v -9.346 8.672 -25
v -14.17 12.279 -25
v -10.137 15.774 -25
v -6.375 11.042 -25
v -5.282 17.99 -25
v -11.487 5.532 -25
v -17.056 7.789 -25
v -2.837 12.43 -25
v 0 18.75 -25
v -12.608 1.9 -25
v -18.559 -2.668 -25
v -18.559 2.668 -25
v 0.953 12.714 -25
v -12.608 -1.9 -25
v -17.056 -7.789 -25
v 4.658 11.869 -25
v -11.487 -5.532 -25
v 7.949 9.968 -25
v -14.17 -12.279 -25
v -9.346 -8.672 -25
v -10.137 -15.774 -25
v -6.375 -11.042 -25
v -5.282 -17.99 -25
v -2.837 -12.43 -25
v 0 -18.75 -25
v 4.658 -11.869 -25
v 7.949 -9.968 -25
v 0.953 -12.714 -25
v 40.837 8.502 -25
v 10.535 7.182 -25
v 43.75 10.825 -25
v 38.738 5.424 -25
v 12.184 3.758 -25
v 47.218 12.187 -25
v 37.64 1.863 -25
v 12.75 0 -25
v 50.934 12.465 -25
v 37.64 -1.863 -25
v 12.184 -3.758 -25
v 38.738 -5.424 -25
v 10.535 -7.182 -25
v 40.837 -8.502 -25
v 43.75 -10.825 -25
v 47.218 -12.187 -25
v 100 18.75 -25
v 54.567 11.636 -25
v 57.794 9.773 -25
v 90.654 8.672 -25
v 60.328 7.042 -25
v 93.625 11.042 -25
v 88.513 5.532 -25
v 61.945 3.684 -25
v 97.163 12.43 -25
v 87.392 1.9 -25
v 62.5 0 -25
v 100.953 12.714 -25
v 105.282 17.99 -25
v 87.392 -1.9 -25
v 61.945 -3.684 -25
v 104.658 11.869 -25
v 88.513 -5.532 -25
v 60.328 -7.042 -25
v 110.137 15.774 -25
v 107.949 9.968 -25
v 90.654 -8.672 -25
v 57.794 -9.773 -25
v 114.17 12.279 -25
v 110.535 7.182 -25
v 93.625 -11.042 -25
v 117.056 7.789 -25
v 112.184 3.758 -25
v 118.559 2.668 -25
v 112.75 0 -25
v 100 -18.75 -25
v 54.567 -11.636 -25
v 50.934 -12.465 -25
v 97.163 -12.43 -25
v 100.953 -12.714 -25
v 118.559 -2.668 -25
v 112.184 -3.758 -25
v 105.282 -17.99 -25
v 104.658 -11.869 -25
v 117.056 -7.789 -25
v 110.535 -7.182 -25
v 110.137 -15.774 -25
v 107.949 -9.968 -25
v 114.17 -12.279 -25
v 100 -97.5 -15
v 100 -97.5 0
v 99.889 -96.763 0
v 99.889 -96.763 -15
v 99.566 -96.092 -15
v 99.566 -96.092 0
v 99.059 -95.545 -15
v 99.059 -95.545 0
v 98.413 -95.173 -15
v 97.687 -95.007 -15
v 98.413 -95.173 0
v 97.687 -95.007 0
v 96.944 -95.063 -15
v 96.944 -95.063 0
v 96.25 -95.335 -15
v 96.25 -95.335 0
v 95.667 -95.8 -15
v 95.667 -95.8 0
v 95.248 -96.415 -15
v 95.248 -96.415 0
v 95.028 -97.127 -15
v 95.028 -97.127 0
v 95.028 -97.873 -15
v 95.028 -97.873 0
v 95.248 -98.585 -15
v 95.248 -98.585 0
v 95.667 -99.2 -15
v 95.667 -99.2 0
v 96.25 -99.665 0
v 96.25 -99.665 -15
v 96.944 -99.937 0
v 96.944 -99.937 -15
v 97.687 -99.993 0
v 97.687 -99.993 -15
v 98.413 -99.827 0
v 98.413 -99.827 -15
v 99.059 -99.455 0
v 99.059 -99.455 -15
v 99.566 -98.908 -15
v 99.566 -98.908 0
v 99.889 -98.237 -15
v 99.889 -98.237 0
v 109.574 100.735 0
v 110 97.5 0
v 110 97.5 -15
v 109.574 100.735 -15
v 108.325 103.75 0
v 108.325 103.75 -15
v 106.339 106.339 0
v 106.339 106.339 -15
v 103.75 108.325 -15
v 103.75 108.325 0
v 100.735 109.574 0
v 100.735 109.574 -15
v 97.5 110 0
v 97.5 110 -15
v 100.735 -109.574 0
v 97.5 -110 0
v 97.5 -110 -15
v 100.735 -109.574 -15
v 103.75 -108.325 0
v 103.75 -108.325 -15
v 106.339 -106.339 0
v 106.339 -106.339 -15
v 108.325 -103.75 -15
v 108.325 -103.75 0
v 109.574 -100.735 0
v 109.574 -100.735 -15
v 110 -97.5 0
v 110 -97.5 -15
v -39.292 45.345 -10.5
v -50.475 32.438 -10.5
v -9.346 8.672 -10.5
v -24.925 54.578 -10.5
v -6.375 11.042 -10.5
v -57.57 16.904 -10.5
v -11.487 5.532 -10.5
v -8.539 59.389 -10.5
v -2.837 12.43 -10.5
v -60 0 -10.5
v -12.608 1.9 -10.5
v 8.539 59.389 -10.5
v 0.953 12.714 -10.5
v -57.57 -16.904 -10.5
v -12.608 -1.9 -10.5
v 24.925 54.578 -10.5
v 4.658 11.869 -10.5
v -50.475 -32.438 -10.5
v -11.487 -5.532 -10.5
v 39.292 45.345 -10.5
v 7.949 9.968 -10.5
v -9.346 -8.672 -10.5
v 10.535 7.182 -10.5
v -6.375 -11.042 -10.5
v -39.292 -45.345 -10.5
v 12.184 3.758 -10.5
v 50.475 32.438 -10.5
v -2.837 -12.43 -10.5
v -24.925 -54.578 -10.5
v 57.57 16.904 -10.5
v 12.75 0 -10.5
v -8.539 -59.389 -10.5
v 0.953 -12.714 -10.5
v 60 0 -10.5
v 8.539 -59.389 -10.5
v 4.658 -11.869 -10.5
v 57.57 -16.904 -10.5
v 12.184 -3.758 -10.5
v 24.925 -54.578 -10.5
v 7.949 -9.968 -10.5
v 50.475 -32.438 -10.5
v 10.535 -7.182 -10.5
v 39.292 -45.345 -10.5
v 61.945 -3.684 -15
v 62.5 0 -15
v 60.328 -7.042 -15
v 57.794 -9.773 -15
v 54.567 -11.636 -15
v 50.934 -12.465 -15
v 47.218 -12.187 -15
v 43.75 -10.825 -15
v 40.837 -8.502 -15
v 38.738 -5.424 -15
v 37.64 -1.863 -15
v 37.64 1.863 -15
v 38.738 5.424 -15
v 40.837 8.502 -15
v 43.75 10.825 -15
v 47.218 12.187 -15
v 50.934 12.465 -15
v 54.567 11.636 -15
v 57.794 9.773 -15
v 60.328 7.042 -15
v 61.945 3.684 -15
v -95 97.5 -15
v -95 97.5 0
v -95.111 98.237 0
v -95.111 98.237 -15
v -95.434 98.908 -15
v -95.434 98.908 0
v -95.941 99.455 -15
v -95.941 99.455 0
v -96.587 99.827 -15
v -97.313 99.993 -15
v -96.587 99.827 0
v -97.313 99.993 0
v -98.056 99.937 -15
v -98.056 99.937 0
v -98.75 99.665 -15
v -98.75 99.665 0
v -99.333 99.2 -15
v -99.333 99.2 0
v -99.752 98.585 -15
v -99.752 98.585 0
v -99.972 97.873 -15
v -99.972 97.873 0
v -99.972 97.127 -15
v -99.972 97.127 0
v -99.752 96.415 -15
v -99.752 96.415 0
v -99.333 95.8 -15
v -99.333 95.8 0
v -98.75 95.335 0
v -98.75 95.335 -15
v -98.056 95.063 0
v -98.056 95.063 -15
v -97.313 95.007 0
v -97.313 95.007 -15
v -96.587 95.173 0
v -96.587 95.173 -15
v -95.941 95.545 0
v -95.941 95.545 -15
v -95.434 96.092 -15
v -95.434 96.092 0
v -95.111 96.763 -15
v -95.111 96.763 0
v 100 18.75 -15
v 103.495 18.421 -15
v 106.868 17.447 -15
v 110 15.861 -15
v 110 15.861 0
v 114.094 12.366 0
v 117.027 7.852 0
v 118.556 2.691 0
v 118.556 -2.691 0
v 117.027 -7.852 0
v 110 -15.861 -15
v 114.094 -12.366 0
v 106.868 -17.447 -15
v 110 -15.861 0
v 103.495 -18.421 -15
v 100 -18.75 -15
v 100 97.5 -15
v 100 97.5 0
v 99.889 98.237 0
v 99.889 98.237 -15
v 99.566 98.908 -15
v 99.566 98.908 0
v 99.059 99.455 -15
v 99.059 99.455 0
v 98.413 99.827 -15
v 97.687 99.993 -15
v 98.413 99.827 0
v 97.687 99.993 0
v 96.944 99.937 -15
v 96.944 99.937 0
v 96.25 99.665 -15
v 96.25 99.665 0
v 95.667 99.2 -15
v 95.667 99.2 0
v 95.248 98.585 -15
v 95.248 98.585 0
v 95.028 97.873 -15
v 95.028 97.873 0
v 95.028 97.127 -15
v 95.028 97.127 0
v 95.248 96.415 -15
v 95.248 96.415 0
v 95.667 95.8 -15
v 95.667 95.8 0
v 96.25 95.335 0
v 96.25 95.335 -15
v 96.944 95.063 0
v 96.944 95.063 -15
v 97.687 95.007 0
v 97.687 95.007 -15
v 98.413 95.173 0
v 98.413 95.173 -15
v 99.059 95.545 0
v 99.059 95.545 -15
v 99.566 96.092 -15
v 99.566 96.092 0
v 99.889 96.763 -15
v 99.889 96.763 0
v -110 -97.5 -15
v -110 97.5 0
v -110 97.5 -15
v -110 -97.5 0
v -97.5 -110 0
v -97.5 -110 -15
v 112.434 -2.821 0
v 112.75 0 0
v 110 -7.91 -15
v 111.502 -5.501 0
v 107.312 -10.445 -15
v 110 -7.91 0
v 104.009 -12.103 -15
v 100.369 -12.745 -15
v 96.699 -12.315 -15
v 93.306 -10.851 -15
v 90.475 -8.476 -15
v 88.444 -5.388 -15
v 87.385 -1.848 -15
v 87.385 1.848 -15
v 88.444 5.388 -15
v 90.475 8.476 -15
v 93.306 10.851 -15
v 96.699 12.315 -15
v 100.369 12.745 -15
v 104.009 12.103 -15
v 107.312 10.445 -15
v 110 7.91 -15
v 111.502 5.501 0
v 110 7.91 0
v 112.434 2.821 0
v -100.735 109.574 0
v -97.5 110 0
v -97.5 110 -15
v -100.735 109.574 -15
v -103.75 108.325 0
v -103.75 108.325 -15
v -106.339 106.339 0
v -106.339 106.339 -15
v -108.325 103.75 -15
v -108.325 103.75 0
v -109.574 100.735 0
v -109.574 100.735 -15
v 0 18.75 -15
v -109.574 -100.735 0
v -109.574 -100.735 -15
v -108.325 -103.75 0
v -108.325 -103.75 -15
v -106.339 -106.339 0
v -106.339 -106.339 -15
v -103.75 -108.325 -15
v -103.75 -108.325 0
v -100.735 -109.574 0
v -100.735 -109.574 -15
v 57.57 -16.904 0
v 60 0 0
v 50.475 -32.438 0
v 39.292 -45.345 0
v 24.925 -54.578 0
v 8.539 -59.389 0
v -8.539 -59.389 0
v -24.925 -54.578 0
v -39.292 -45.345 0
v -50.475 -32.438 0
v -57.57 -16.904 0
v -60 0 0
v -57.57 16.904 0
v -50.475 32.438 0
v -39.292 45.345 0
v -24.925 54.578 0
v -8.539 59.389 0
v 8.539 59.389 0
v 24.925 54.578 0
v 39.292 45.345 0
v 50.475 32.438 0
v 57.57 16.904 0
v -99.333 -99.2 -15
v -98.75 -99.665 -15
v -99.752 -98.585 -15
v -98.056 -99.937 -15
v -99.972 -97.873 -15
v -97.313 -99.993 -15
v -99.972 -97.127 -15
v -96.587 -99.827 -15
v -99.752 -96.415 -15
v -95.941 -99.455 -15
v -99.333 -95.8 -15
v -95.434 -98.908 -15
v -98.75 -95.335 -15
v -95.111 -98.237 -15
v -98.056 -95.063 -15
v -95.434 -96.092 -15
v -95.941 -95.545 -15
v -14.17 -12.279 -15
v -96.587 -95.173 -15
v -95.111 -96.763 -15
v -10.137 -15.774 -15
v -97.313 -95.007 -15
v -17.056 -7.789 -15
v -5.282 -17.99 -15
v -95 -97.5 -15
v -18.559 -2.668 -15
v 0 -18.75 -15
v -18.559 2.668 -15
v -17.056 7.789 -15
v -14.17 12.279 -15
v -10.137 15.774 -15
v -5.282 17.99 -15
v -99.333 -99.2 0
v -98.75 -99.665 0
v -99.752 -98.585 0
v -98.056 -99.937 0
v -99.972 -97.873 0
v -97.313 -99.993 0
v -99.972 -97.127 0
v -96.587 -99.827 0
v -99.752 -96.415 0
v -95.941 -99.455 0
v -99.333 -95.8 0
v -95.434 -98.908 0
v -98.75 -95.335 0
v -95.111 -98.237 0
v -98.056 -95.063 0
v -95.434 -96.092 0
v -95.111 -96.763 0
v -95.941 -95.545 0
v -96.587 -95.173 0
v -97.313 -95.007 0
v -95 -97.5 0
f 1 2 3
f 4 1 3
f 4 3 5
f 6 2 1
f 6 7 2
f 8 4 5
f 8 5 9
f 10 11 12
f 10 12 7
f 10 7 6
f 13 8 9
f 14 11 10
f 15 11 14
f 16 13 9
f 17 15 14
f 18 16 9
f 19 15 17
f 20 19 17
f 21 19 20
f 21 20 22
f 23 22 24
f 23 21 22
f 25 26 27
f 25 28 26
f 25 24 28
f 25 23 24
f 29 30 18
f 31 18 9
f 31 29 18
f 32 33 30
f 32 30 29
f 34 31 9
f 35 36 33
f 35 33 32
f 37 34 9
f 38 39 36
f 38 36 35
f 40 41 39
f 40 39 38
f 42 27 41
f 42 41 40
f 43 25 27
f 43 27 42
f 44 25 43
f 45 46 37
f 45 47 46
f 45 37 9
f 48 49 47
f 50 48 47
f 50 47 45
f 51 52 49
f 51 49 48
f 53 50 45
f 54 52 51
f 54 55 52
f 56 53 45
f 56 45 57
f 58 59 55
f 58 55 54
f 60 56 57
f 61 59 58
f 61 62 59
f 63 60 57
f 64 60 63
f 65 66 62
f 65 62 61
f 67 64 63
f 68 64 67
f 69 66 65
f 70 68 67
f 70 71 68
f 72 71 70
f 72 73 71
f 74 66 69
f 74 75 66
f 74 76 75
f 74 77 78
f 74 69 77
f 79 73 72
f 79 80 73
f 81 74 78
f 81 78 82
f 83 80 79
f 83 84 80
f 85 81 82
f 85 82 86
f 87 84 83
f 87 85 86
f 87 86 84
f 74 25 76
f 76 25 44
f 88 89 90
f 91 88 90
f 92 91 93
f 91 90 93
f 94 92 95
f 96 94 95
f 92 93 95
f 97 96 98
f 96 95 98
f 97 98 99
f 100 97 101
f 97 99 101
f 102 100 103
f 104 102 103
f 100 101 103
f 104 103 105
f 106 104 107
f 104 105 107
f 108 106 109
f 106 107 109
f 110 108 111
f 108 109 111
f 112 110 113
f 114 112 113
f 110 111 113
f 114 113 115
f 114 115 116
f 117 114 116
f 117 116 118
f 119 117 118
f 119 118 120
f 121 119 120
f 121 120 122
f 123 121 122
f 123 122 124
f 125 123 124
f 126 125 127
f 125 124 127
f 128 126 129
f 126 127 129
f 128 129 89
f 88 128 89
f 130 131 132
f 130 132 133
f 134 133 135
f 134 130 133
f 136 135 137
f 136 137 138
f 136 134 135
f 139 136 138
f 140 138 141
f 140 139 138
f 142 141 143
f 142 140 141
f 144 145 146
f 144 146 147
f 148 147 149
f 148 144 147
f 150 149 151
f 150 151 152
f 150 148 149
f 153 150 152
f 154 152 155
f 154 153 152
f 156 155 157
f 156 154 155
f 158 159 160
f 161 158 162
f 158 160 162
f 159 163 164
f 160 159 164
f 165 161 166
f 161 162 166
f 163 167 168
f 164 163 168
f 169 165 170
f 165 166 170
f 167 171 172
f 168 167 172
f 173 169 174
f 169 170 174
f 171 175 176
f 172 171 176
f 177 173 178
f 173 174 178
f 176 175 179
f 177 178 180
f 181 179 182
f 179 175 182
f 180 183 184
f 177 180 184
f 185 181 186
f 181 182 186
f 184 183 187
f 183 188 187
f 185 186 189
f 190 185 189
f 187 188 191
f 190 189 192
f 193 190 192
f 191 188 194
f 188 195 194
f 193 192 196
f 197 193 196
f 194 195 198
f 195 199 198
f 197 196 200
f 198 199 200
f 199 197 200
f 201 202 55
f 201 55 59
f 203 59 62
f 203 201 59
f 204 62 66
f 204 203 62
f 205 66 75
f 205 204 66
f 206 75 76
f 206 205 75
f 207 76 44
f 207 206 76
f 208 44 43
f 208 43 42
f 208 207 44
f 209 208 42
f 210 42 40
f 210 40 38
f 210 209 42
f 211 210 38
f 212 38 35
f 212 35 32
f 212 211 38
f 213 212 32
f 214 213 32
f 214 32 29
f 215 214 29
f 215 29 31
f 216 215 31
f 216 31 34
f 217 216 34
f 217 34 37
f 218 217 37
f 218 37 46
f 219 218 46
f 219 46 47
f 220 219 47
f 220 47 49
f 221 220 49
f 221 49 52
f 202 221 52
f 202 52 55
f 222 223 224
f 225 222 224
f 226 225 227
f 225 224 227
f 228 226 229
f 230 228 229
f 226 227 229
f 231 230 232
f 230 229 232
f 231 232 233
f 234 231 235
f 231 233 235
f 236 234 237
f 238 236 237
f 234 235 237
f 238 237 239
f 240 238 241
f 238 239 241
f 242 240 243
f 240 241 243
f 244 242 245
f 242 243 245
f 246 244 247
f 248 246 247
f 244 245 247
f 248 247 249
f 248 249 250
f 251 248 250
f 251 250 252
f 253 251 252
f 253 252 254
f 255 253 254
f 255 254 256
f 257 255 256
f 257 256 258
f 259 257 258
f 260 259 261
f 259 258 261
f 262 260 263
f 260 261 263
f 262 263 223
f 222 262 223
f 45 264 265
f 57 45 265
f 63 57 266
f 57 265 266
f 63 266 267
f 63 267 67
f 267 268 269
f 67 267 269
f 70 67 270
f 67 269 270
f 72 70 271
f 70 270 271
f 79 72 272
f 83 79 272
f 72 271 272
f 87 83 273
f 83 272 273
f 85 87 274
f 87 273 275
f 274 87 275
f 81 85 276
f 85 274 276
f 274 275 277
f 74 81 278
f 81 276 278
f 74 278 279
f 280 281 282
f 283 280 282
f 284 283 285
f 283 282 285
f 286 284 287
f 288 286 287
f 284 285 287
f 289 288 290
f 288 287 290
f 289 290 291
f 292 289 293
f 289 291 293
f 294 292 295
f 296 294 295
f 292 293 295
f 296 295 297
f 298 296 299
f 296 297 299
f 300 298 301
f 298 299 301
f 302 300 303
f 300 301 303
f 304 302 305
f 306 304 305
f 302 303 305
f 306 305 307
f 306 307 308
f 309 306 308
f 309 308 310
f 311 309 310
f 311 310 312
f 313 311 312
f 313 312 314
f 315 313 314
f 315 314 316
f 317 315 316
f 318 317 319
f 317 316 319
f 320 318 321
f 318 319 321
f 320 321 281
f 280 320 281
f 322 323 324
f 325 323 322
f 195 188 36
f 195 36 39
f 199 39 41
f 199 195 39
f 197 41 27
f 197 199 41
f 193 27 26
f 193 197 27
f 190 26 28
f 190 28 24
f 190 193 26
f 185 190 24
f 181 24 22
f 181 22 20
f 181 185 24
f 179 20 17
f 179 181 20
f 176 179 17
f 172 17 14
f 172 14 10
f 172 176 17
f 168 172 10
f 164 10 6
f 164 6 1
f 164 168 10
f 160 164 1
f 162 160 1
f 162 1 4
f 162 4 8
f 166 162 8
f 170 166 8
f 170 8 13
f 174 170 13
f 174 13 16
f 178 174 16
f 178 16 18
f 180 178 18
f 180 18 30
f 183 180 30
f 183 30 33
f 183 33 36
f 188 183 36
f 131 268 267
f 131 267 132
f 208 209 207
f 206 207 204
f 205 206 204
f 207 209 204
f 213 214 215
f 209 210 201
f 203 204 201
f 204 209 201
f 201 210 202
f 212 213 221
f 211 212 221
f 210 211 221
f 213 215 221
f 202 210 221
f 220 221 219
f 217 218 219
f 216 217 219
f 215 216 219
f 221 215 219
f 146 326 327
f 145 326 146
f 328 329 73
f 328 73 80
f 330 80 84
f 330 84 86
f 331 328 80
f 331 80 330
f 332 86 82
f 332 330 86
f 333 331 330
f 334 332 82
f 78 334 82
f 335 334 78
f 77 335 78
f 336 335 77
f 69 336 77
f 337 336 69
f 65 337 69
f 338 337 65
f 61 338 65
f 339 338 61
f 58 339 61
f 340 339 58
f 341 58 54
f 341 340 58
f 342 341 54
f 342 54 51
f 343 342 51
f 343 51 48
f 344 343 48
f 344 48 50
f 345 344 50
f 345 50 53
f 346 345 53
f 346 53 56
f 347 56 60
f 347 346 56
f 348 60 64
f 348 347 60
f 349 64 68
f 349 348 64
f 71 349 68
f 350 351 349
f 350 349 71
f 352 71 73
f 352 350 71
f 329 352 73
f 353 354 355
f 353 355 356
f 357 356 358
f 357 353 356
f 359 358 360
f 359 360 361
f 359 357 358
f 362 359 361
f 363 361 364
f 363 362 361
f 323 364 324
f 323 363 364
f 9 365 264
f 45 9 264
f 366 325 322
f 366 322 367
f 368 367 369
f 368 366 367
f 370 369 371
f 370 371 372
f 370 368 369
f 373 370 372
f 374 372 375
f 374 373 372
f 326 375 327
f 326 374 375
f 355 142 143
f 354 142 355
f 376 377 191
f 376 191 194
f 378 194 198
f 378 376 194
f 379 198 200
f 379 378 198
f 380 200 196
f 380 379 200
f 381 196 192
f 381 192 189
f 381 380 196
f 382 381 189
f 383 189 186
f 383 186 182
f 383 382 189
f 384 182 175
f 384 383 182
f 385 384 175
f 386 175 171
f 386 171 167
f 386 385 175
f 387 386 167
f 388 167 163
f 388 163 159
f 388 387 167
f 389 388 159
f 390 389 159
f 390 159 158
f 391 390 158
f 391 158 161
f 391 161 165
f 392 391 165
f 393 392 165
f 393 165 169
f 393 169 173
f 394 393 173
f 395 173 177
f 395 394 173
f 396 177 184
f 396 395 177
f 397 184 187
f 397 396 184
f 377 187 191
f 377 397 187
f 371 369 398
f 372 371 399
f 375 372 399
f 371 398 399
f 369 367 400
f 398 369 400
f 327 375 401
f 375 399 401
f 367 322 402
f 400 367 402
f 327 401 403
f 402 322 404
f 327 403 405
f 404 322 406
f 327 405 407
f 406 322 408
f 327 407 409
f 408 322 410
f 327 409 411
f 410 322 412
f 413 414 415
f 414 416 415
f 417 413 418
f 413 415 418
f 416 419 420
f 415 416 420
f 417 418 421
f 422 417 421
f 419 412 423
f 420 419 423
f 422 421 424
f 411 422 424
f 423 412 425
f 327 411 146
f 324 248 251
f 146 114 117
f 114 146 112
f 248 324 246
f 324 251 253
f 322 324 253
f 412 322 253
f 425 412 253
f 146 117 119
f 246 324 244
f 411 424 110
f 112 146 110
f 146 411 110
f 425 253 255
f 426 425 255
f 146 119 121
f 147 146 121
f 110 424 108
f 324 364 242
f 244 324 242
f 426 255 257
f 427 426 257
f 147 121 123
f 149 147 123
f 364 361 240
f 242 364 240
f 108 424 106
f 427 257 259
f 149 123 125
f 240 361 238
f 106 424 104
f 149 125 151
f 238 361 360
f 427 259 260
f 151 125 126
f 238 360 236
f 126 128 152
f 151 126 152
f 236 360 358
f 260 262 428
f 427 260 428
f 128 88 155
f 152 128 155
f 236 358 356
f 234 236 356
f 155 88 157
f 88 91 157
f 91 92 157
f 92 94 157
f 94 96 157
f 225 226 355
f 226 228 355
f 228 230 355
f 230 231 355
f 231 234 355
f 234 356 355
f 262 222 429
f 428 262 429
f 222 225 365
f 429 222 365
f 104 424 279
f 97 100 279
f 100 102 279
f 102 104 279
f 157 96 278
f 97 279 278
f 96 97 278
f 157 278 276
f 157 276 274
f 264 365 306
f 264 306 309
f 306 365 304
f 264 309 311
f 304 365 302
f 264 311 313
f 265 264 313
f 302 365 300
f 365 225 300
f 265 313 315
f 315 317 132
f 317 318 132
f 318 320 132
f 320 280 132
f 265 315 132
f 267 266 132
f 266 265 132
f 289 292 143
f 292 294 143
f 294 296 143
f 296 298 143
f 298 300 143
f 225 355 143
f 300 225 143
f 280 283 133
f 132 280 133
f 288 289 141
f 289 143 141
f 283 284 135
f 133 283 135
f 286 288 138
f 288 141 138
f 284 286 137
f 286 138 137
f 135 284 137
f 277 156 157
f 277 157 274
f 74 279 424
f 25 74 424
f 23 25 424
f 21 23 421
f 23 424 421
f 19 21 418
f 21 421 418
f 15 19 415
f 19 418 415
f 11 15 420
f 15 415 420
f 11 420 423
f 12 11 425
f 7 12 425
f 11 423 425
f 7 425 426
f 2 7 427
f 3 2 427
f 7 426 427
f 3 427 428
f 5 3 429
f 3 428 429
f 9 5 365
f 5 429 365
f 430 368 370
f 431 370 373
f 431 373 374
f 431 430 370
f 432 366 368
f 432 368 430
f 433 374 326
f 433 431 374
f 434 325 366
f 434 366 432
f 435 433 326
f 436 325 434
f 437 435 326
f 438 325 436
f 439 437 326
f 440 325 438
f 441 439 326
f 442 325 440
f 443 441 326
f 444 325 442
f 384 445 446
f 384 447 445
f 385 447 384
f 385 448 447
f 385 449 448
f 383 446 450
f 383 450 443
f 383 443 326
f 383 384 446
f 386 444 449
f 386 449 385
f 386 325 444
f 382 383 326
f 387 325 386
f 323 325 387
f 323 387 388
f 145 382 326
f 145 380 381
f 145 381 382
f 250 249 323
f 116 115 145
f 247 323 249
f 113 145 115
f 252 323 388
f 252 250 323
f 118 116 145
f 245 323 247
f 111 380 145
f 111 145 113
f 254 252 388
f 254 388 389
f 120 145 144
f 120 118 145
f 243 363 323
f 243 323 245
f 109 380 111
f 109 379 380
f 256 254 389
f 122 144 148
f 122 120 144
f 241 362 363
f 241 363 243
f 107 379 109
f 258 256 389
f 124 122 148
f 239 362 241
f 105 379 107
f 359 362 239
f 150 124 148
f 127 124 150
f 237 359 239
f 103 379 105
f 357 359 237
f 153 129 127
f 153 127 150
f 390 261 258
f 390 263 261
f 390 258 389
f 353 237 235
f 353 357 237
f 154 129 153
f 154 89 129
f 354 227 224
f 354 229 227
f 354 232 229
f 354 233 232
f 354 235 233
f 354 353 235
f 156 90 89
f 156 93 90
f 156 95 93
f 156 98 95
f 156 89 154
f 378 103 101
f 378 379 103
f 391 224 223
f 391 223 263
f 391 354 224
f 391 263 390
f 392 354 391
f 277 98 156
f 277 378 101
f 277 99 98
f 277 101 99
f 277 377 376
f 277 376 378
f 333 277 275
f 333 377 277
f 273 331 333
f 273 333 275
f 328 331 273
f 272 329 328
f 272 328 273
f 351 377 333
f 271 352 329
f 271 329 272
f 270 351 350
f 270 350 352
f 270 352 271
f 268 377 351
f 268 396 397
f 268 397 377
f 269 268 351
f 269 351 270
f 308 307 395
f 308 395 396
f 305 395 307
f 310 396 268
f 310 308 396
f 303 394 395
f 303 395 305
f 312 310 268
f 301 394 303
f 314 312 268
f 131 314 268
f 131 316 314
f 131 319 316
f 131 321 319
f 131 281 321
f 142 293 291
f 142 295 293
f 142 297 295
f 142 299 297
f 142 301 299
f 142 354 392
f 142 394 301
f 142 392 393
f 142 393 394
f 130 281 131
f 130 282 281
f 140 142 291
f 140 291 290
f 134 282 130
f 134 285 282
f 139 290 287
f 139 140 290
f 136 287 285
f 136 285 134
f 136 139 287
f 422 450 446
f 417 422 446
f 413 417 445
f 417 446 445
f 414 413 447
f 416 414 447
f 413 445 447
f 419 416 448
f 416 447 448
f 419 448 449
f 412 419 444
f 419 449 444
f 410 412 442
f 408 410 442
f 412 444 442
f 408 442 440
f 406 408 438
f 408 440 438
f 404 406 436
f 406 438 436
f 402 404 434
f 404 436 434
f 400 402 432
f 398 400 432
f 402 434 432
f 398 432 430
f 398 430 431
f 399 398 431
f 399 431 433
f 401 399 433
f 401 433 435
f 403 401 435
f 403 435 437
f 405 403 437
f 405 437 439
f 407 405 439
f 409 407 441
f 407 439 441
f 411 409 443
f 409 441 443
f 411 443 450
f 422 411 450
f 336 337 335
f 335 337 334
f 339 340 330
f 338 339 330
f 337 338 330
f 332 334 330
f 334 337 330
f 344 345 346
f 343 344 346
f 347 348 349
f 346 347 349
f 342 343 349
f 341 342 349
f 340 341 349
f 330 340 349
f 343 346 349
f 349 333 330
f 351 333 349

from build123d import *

# Parameters (mm, degrees)
SKETCH074_R     = 2.5
SKETCH074_R_2   = 16
PAD042_DEPTH    = 15
SKETCH060_R     = 12.75
SKETCH060_R_2   = 12.5
PAD043_DEPTH    = 25
SKETCH064_R     = 60
POCKET036_DEPTH = 10.5


with BuildPart() as part:
    # Sketch074 → Pad042 (new body)
    with BuildSketch(Plane.XY):
        with BuildLine():
            ThreePointArc((-97.5, 110), (-106.338835, 106.338835), (-110, 97.5))
            Line((-110, 97.5), (-110, -97.5))
            ThreePointArc((-110, -97.5), (-106.338835, -106.338835), (-97.5, -110))
            Line((-97.5, -110), (97.5, -110))
            ThreePointArc((97.5, -110), (106.338835, -106.338835), (110, -97.5))
            Line((110, -97.5), (110, 97.5))
            ThreePointArc((110, 97.5), (106.338835, 106.338835), (97.5, 110))
            Line((97.5, 110), (-97.5, 110))
        make_face()
        with Locations((-97.5, 97.5)):
            Circle(SKETCH074_R, mode=Mode.SUBTRACT)
        with Locations((97.5, 97.5)):
            Circle(SKETCH074_R, mode=Mode.SUBTRACT)
        with Locations((-97.5, -97.5)):
            Circle(SKETCH074_R, mode=Mode.SUBTRACT)
        with Locations((97.5, -97.5)):
            Circle(SKETCH074_R, mode=Mode.SUBTRACT)
        Circle(SKETCH074_R_2, mode=Mode.SUBTRACT)
    extrude(amount=-PAD042_DEPTH)

    # Sketch060 → Pad043 (join)
    with BuildSketch(Plane(origin=(0, 0, 0), x_dir=(1, 0, 0), z_dir=(0, 0, -1))):
        with BuildLine():
            ThreePointArc((0, 18.75), (-18.75, 0), (0, -18.75))
            Line((0, -18.75), (100, -18.75))
            ThreePointArc((100, -18.75), (118.75, 0), (100, 18.75))
            Line((100, 18.75), (0, 18.75))
        make_face()
        Circle(SKETCH060_R, mode=Mode.SUBTRACT)
        with Locations((100, 0)):
            Circle(SKETCH060_R, mode=Mode.SUBTRACT)
        with Locations((50, 0)):
            Circle(SKETCH060_R_2, mode=Mode.SUBTRACT)
    extrude(amount=PAD043_DEPTH)

    # Sketch064 → Pocket036 (cut)
    with BuildSketch(Plane(origin=(0, 0, 0), x_dir=(1, 0, 0), z_dir=(0, 0, -1))):
        Circle(SKETCH064_R)
    extrude(amount=POCKET036_DEPTH, mode=Mode.SUBTRACT)


solid = part.part
